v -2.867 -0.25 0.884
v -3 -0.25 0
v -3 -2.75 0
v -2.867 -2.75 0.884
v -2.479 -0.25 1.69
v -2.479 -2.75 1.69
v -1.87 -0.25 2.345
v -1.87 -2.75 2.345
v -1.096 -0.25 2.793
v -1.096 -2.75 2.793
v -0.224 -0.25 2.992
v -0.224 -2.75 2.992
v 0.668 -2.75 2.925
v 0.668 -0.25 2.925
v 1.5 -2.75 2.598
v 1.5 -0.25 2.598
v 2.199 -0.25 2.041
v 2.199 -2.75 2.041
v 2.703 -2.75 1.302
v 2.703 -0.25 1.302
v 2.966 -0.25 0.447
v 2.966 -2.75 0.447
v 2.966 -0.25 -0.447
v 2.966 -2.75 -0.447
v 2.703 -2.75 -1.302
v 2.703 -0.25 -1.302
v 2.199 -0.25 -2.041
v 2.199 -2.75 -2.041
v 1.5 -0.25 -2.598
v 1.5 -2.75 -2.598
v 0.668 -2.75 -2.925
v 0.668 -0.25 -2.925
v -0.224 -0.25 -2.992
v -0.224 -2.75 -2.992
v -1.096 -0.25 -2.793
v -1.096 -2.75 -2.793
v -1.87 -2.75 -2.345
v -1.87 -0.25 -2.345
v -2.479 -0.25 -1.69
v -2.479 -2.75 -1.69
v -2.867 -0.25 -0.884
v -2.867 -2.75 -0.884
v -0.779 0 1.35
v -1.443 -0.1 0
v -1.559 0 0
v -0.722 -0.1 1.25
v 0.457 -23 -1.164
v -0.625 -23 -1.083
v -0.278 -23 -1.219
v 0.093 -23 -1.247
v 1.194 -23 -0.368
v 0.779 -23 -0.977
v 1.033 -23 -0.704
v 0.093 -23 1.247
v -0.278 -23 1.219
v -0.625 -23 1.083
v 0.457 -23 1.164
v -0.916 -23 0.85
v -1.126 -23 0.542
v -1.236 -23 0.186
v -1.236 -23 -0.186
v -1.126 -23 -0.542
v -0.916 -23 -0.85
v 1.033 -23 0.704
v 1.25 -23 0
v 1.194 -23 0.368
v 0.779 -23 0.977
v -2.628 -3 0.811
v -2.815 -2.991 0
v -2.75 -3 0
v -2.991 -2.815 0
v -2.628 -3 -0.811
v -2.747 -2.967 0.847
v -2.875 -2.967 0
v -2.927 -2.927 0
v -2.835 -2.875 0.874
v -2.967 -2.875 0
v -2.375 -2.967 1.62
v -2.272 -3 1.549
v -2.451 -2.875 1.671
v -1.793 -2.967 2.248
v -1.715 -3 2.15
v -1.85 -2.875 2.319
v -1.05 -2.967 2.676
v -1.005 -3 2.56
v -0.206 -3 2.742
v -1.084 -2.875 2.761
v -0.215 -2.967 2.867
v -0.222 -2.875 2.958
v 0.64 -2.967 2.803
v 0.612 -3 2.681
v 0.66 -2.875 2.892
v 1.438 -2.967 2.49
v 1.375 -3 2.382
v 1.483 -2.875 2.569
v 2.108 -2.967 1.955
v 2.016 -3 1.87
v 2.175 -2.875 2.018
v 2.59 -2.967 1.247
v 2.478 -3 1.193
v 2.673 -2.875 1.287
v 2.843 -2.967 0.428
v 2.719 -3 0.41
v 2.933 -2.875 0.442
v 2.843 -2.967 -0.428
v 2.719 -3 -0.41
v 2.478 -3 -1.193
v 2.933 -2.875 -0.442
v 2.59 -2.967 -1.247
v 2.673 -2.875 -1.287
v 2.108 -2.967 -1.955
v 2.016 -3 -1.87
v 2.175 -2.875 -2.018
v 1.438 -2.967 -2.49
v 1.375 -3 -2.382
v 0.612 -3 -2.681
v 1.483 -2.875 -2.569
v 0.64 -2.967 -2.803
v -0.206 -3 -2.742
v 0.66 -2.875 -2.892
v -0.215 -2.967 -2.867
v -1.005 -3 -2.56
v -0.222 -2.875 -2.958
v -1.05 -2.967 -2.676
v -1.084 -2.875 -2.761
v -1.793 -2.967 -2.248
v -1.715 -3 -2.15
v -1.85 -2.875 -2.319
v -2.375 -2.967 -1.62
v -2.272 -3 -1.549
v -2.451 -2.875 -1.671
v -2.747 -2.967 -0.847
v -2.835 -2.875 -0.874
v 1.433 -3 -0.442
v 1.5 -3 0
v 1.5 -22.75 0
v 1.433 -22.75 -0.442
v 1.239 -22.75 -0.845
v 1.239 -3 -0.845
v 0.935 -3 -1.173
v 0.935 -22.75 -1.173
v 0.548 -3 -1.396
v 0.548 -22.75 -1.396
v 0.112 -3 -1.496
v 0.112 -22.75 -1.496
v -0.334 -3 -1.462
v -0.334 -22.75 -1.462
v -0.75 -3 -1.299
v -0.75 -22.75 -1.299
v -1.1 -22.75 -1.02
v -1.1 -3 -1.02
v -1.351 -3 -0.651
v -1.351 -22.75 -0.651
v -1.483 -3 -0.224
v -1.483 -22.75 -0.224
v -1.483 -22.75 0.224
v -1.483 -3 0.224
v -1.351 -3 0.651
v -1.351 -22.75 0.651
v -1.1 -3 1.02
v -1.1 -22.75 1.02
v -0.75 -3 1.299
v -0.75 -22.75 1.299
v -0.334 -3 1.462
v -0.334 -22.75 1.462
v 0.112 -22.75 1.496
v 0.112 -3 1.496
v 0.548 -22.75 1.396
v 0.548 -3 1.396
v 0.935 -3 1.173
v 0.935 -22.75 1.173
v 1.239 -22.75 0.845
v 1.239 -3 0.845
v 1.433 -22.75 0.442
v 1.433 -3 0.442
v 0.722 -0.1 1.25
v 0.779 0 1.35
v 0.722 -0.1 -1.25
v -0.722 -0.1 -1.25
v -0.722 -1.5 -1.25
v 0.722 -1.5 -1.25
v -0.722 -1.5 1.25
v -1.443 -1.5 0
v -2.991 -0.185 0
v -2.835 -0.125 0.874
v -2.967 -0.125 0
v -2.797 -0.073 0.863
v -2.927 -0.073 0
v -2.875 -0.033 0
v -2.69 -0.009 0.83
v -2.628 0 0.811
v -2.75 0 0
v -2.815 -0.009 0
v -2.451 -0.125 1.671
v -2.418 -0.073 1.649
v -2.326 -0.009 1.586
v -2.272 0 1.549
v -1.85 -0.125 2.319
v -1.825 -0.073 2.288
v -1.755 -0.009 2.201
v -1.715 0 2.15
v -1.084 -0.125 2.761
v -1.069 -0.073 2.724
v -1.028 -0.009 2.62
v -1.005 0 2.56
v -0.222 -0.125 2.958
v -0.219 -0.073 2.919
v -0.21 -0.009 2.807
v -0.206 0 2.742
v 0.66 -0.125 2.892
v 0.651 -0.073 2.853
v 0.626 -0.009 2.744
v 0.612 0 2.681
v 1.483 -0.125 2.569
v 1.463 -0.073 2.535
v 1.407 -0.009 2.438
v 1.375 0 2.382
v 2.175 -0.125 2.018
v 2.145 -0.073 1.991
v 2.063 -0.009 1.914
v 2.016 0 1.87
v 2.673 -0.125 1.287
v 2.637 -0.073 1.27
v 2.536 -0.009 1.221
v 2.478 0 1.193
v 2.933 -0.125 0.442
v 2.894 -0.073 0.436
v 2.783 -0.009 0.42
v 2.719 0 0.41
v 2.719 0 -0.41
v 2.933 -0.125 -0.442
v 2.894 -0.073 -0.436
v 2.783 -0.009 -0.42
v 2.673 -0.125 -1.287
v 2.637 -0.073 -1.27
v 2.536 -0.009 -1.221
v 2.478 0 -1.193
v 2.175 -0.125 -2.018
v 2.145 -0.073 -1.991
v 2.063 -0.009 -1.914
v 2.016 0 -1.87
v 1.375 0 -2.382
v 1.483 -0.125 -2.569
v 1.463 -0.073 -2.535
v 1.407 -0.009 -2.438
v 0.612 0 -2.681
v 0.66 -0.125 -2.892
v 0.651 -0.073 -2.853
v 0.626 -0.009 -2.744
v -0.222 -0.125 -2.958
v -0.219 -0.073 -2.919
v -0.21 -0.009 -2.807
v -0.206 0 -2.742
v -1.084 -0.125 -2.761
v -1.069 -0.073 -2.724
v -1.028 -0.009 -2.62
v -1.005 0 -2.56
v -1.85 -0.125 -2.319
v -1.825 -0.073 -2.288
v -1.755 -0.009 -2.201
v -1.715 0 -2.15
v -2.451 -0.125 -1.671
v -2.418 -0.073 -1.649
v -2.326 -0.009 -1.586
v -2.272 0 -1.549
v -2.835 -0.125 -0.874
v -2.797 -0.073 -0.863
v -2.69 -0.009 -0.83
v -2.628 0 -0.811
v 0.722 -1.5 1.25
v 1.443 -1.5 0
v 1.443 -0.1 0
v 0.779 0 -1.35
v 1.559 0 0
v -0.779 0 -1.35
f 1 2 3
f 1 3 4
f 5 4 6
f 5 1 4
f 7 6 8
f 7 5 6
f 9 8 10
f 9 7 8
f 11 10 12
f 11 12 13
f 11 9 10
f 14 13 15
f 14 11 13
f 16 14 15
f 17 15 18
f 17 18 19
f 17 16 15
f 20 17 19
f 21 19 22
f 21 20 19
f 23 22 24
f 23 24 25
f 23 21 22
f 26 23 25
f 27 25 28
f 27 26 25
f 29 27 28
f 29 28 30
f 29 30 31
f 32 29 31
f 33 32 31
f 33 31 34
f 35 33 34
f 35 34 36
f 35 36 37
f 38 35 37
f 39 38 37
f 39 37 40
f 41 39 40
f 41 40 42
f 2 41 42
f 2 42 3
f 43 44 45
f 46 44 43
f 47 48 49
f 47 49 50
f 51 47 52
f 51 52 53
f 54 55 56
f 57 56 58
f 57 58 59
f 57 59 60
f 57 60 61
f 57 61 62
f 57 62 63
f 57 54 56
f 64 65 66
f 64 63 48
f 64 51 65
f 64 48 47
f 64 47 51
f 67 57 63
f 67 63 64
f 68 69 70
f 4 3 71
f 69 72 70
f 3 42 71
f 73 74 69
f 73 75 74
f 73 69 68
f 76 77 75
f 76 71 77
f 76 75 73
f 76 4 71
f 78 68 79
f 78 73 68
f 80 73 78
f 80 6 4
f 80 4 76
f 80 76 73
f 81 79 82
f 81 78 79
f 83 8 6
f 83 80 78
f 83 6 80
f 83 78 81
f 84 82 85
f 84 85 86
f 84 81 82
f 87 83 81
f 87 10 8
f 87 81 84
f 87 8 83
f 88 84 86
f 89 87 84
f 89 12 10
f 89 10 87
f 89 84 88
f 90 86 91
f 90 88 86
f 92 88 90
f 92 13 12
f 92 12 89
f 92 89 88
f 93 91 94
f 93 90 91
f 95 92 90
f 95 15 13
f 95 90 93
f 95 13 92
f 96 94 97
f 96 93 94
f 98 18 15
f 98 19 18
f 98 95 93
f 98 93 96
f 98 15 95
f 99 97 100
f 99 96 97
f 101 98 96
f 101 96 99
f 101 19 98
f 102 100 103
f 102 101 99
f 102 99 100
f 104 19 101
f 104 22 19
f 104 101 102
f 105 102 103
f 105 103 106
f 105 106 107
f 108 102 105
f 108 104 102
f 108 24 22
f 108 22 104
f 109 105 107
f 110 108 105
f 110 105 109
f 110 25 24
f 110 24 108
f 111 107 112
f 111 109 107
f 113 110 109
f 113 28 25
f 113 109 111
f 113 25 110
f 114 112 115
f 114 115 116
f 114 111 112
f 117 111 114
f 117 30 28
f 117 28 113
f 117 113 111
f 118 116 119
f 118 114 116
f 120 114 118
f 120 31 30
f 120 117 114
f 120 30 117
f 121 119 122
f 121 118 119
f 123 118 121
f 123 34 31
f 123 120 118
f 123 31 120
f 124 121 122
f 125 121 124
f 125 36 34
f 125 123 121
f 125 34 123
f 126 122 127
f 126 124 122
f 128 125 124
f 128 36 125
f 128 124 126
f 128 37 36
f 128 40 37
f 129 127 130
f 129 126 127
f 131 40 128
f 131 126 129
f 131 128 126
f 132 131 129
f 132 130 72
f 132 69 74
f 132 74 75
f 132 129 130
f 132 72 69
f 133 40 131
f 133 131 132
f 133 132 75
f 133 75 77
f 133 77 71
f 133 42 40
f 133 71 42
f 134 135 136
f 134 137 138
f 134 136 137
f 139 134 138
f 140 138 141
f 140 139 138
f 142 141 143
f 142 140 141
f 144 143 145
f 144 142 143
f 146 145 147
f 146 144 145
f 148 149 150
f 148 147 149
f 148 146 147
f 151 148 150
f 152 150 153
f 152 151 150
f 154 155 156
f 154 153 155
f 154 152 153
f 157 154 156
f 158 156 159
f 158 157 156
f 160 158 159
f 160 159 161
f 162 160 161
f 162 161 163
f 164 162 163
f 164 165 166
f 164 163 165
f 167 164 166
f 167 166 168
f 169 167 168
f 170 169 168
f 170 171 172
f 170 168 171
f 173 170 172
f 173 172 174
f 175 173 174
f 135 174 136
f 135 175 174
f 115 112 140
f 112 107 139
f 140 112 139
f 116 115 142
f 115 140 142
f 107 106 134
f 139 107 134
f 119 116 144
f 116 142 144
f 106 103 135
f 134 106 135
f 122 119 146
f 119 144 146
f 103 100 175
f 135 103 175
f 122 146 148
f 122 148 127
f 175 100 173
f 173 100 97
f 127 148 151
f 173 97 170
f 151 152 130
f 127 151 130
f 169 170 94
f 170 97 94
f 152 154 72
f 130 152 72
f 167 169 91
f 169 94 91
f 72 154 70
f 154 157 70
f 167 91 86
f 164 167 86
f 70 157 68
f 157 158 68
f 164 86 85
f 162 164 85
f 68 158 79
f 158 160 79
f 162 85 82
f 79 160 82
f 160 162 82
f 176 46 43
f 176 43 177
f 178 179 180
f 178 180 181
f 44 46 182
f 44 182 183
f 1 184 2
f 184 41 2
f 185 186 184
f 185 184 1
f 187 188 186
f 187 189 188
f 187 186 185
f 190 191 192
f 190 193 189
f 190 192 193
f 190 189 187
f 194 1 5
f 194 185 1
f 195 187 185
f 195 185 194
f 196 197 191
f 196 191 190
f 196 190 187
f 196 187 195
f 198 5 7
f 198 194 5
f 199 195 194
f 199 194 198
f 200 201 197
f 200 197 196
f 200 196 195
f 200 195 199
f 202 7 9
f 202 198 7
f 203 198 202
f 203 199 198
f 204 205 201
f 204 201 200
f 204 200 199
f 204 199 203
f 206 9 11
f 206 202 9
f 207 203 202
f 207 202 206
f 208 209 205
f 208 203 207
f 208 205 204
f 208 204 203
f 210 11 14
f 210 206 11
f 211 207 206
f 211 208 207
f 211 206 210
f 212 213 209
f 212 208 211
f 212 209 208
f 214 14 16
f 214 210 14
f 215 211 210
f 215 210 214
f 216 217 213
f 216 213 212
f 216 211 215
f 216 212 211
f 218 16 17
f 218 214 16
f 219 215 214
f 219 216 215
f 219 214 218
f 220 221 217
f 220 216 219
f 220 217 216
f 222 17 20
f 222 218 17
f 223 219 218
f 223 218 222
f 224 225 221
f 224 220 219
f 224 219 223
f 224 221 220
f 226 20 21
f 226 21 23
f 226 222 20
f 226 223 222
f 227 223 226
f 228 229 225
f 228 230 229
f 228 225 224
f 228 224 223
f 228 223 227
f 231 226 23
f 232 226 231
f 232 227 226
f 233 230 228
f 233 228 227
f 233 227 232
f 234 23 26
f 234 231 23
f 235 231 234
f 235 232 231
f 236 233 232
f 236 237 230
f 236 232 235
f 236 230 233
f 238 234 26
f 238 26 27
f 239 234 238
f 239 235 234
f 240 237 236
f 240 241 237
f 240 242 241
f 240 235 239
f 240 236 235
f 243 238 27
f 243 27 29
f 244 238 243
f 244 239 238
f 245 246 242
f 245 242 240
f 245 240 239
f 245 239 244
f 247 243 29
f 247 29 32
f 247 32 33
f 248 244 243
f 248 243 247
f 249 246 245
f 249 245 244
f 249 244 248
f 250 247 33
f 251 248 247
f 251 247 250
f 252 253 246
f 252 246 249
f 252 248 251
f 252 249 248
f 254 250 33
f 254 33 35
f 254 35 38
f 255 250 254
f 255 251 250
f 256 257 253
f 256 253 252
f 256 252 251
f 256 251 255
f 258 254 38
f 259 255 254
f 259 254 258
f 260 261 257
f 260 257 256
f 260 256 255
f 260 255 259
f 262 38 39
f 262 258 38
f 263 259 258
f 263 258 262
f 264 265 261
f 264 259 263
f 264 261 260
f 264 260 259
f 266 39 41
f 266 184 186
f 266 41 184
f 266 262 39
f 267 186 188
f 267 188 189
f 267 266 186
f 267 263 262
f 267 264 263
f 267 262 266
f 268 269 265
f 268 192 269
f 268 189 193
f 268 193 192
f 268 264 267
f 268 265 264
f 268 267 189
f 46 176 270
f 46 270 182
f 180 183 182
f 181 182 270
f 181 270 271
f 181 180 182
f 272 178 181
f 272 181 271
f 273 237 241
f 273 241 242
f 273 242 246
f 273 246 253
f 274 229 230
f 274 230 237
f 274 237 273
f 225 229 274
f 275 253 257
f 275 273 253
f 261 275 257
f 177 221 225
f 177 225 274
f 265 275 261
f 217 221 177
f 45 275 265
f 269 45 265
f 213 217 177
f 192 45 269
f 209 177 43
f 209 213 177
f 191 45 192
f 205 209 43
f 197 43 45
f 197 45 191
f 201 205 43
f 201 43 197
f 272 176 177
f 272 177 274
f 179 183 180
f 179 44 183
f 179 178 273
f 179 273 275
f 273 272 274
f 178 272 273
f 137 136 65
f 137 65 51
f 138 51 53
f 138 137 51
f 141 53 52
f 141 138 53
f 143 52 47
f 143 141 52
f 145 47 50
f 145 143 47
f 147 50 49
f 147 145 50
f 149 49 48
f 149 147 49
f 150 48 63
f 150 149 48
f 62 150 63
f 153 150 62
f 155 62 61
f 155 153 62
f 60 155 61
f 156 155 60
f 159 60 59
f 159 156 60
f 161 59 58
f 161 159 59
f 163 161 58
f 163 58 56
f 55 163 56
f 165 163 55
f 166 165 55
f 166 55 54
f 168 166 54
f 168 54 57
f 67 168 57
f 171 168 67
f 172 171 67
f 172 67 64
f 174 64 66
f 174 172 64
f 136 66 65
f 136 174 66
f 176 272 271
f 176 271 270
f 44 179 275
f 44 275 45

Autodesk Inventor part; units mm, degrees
ref_plane "YZ Plane" through (0, 0, 0) normal (1, 0, 0) x (0, 1, 0)
ref_plane "XZ Plane" through (0, 0, 0) normal (0, 1, 0) x (-1, 0, 0)
ref_plane "XY Plane" through (0, 0, 0) normal (0, 0, 1) x (1, 0, 0)
sketch "Sketch1" plane through (0, 0, 0) normal (0, 1, 0) x (-1, 0, 0)
  circle A0 centre (0, 0) radius 3
  dimension "d0" = 6
extrude "Extrusion1" add sketch "Sketch1" against normal blind 3
sketch "Sketch2" plane through (0, -3, 0) normal (0, -1, 0) x (1, 0, 0)
  circle A0 centre (0, 0) radius 1.5
  dimension "d3" = 3
extrude "Extrusion2" add sketch "Sketch2" along normal blind 20
sketch "Sketch3" plane through (0, 0, 0) normal (0, 1, 0) x (1, 0, 0)
  circle A0 centre (0, 0) radius 1.5 construction
  line L0 (1.4434, 0) -> (0.7217, -1.25)
  line L1 (0.7217, -1.25) -> (-0.7217, -1.25)
  line L2 (-0.7217, -1.25) -> (-1.4434, 0)
  line L3 (-1.4434, 0) -> (-0.7217, 1.25)
  line L4 (-0.7217, 1.25) -> (0.7217, 1.25)
  line L5 (0.7217, 1.25) -> (1.4434, 0)
  dimension "d8" = 2.5
extrude "Extrusion3" cut sketch "Sketch3" against normal blind 1.5
chamfer "Chamfer1" distance 0.25 angle 45 1 edges at (-1.5, -23, 0)
fillet "Fillet1" radius 0.25 2 edges at (3, 0, 0) (3, -3, 0)
chamfer "Chamfer2" distance 0.1 angle 45 6 edges at (0, 0, -1.25) (1.0825, 0, -0.625) (1.0825, 0, 0.625) (0, 0, 1.25) (-1.0825, 0, 0.625) (-1.0825, 0, -0.625)
thread "Thread2" size "M3x0.5" class "6g" standard "ANSI Metric M Profile" full length
properties part number "M3-20" material "Steel, Carbon"
